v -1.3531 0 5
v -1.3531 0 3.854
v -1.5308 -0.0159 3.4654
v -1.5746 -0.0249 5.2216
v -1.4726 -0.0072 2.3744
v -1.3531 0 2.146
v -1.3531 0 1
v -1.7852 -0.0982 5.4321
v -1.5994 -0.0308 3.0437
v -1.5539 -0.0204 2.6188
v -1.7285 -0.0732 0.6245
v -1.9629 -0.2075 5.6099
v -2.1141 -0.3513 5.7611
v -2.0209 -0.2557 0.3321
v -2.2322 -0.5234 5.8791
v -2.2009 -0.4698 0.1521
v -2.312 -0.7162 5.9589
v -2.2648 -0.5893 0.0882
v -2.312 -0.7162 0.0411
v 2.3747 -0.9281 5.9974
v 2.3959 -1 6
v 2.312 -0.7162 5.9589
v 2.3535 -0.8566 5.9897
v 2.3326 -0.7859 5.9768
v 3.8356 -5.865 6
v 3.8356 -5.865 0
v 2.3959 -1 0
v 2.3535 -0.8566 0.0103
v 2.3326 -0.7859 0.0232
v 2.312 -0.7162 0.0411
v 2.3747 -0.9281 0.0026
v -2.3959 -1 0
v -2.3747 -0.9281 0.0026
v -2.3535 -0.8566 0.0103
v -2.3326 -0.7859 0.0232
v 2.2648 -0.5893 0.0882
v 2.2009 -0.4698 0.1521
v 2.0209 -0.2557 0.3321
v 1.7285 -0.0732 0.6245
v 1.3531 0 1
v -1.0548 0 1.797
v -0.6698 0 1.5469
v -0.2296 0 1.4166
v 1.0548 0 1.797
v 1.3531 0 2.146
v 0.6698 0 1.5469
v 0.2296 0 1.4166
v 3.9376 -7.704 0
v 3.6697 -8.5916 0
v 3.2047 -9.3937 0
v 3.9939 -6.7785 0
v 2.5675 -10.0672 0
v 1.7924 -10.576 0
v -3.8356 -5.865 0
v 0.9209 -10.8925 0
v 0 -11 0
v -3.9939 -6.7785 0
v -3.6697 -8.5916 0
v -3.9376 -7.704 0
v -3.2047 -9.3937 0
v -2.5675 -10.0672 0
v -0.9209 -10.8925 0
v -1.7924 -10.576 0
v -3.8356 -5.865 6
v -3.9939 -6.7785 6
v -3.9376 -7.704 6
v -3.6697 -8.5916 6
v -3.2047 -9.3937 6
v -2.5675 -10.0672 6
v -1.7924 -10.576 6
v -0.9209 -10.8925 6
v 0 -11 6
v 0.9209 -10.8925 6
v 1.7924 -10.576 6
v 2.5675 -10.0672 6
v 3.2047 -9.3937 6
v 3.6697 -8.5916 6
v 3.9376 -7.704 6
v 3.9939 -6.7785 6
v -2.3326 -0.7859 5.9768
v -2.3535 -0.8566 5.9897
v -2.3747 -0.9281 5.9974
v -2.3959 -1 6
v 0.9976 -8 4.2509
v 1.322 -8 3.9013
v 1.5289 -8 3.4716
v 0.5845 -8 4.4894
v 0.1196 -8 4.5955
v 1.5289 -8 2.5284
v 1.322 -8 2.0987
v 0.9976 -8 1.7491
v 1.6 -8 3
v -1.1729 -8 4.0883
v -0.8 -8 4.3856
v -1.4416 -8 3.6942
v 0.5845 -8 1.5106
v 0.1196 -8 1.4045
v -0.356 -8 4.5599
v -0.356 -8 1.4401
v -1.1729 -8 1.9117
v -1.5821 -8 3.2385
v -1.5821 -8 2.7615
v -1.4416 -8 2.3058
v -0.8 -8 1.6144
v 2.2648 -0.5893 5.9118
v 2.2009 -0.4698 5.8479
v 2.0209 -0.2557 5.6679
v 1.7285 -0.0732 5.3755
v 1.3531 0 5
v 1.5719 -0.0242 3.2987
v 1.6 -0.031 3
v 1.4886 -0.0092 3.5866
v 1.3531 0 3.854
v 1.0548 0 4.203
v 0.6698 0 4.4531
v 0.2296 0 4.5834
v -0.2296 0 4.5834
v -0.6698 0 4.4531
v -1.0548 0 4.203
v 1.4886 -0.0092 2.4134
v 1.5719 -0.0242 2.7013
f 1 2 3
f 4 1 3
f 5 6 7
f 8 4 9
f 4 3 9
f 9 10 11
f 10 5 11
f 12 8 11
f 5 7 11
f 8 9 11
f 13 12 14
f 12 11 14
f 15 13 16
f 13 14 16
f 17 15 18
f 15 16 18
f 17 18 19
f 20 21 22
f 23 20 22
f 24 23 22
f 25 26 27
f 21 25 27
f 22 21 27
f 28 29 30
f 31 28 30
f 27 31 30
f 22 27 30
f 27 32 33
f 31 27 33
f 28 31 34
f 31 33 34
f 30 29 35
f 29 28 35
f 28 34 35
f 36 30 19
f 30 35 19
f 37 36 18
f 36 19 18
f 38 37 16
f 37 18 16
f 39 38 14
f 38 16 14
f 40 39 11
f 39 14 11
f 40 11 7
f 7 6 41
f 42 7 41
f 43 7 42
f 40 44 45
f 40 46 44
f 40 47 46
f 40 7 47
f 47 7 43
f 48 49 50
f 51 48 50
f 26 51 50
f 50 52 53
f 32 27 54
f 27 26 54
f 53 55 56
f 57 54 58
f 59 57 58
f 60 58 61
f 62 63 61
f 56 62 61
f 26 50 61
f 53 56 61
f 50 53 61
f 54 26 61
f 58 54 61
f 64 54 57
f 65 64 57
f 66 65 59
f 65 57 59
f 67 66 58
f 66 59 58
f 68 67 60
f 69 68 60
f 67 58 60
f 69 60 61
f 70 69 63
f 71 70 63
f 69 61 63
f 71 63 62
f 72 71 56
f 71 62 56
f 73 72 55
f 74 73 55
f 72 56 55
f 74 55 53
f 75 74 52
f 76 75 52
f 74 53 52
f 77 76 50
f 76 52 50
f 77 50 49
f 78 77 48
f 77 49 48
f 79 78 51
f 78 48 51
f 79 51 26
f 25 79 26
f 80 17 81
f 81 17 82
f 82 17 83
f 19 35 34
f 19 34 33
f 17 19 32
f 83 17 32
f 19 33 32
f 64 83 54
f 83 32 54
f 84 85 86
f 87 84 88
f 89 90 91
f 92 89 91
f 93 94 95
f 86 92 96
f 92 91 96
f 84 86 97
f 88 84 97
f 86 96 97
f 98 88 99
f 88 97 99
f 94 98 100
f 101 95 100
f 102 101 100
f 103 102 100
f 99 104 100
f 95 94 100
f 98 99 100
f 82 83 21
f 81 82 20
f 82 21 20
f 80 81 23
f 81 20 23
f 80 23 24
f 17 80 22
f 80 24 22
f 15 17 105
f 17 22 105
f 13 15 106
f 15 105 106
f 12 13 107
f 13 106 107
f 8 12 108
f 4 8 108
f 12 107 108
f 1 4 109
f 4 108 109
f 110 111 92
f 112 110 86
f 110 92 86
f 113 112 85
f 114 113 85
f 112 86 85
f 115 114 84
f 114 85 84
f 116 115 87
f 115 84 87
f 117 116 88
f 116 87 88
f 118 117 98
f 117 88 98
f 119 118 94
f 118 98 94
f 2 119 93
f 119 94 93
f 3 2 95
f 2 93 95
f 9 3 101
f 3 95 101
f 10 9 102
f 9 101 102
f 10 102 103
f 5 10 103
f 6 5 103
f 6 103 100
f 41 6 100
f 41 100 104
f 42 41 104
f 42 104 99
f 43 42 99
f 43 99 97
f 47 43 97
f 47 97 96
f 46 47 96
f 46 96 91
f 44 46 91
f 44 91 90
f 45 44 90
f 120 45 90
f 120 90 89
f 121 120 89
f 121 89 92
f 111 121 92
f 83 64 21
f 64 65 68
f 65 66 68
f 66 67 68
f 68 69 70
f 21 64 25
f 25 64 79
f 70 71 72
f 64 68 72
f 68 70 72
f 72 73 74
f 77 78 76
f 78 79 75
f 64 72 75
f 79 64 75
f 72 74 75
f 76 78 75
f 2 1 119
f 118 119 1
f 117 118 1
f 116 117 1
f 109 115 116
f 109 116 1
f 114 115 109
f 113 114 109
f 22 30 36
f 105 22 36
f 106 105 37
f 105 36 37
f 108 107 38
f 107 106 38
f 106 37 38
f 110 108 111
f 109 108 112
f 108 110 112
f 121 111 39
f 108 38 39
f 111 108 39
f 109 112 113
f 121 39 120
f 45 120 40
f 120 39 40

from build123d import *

# Parameters (mm, degrees)
BOSS_EXTRUDE1_DEPTH = 6
BOSS_EXTRUDE2_DEPTH = 8
FILLET1_R           = 1


with BuildPart() as part:
    # Sketch1 → Boss-Extrude1 (new body)
    with BuildSketch(Plane.XY):
        with BuildLine():
            Line((-1.6, 0), (-2.1, 0))
            Line((-2.1, 0), (-3.835581375, -5.864960127))
            ThreePointArc((-3.835581375, -5.864960127), (0, -11), (3.835581375, -5.864960127))
            Line((3.835581375, -5.864960127), (2.1, 0))
            Line((2.1, 0), (1.6, 0))
            Line((1.6, 0), (1.6, -8))
            Line((1.6, -8), (0, -8))
            Line((0, -8), (-1.6, -8))
            Line((-1.6, -8), (-1.6, 0))
        make_face()
    extrude(amount=BOSS_EXTRUDE1_DEPTH)

    # Sketch2 → Boss-Extrude2 (add)
    with BuildSketch(Plane(origin=(0, -8, 0), x_dir=(1, 0, 0), z_dir=(0, 1, 0))):
        with BuildLine():
            Line((1.6, -6), (1.6, -3))
            ThreePointArc((1.6, -3), (0, -4.6), (-1.6, -3))
            Line((-1.6, -3), (-1.6, -6))
            Line((-1.6, -6), (1.6, -6))
        make_face()
        with BuildLine():
            Line((1.6, -3), (1.6, 0))
            Line((1.6, 0), (-1.6, 0))
            Line((-1.6, 0), (-1.6, -3))
            ThreePointArc((-1.6, -3), (0, -1.4), (1.6, -3))
        make_face()
    extrude(amount=BOSS_EXTRUDE2_DEPTH)

    # Fillet1
    # the kernel refuses this fillet: 1 mm, written as the material it takes off along each edge
    with BuildSketch(Plane(origin=(-4.6, 0, 0), x_dir=(0, 0, 1), z_dir=(1, 0, 0))) as fillet1_piece_1:
        with BuildLine():
            CenterArc((FILLET1_R, FILLET1_R), FILLET1_R, 180, 90)
            Line((0, FILLET1_R), (0, 0))
            Line((0, 0), (FILLET1_R, 0))
        make_face()
    extrude(amount=9.2, mode=Mode.SUBTRACT)
    with BuildSketch(Plane(origin=(2.1, 0, -1.867357153), x_dir=(-1, 0, 0), z_dir=(0, 0, 1))) as fillet1_piece_2:
        with BuildLine():
            CenterArc((FILLET1_R * 0.746942861214, FILLET1_R), FILLET1_R, 196.484740183, 73.515259817)
            Line((-FILLET1_R * 0.211952482607, FILLET1_R * 0.716240031718), (0, 0))
            Line((0, 0), (FILLET1_R * 0.746942861214, 0))
        make_face()
    extrude(amount=9.734714306, mode=Mode.SUBTRACT)
    with BuildSketch(Plane(origin=(-2.1, 0, -1.867357153), x_dir=(1, 0, 0), z_dir=(0, 0, 1))) as fillet1_piece_3:
        with BuildLine():
            CenterArc((FILLET1_R * 0.746942861214, -FILLET1_R), FILLET1_R, 90, 73.515259817)
            Line((-FILLET1_R * 0.211952482607, -FILLET1_R * 0.716240031718), (0, 0))
            Line((0, 0), (FILLET1_R * 0.746942861214, 0))
        make_face()
    extrude(amount=9.734714306, mode=Mode.SUBTRACT)
    with BuildSketch(Plane(origin=(4.6, 0, 6), x_dir=(0, -1, 0), z_dir=(-1, 0, 0))) as fillet1_piece_4:
        with BuildLine():
            CenterArc((FILLET1_R, -FILLET1_R), FILLET1_R, 90, 90)
            Line((0, -FILLET1_R), (0, 0))
            Line((0, 0), (FILLET1_R, 0))
        make_face()
    extrude(amount=9.2, mode=Mode.SUBTRACT)


solid = part.part
